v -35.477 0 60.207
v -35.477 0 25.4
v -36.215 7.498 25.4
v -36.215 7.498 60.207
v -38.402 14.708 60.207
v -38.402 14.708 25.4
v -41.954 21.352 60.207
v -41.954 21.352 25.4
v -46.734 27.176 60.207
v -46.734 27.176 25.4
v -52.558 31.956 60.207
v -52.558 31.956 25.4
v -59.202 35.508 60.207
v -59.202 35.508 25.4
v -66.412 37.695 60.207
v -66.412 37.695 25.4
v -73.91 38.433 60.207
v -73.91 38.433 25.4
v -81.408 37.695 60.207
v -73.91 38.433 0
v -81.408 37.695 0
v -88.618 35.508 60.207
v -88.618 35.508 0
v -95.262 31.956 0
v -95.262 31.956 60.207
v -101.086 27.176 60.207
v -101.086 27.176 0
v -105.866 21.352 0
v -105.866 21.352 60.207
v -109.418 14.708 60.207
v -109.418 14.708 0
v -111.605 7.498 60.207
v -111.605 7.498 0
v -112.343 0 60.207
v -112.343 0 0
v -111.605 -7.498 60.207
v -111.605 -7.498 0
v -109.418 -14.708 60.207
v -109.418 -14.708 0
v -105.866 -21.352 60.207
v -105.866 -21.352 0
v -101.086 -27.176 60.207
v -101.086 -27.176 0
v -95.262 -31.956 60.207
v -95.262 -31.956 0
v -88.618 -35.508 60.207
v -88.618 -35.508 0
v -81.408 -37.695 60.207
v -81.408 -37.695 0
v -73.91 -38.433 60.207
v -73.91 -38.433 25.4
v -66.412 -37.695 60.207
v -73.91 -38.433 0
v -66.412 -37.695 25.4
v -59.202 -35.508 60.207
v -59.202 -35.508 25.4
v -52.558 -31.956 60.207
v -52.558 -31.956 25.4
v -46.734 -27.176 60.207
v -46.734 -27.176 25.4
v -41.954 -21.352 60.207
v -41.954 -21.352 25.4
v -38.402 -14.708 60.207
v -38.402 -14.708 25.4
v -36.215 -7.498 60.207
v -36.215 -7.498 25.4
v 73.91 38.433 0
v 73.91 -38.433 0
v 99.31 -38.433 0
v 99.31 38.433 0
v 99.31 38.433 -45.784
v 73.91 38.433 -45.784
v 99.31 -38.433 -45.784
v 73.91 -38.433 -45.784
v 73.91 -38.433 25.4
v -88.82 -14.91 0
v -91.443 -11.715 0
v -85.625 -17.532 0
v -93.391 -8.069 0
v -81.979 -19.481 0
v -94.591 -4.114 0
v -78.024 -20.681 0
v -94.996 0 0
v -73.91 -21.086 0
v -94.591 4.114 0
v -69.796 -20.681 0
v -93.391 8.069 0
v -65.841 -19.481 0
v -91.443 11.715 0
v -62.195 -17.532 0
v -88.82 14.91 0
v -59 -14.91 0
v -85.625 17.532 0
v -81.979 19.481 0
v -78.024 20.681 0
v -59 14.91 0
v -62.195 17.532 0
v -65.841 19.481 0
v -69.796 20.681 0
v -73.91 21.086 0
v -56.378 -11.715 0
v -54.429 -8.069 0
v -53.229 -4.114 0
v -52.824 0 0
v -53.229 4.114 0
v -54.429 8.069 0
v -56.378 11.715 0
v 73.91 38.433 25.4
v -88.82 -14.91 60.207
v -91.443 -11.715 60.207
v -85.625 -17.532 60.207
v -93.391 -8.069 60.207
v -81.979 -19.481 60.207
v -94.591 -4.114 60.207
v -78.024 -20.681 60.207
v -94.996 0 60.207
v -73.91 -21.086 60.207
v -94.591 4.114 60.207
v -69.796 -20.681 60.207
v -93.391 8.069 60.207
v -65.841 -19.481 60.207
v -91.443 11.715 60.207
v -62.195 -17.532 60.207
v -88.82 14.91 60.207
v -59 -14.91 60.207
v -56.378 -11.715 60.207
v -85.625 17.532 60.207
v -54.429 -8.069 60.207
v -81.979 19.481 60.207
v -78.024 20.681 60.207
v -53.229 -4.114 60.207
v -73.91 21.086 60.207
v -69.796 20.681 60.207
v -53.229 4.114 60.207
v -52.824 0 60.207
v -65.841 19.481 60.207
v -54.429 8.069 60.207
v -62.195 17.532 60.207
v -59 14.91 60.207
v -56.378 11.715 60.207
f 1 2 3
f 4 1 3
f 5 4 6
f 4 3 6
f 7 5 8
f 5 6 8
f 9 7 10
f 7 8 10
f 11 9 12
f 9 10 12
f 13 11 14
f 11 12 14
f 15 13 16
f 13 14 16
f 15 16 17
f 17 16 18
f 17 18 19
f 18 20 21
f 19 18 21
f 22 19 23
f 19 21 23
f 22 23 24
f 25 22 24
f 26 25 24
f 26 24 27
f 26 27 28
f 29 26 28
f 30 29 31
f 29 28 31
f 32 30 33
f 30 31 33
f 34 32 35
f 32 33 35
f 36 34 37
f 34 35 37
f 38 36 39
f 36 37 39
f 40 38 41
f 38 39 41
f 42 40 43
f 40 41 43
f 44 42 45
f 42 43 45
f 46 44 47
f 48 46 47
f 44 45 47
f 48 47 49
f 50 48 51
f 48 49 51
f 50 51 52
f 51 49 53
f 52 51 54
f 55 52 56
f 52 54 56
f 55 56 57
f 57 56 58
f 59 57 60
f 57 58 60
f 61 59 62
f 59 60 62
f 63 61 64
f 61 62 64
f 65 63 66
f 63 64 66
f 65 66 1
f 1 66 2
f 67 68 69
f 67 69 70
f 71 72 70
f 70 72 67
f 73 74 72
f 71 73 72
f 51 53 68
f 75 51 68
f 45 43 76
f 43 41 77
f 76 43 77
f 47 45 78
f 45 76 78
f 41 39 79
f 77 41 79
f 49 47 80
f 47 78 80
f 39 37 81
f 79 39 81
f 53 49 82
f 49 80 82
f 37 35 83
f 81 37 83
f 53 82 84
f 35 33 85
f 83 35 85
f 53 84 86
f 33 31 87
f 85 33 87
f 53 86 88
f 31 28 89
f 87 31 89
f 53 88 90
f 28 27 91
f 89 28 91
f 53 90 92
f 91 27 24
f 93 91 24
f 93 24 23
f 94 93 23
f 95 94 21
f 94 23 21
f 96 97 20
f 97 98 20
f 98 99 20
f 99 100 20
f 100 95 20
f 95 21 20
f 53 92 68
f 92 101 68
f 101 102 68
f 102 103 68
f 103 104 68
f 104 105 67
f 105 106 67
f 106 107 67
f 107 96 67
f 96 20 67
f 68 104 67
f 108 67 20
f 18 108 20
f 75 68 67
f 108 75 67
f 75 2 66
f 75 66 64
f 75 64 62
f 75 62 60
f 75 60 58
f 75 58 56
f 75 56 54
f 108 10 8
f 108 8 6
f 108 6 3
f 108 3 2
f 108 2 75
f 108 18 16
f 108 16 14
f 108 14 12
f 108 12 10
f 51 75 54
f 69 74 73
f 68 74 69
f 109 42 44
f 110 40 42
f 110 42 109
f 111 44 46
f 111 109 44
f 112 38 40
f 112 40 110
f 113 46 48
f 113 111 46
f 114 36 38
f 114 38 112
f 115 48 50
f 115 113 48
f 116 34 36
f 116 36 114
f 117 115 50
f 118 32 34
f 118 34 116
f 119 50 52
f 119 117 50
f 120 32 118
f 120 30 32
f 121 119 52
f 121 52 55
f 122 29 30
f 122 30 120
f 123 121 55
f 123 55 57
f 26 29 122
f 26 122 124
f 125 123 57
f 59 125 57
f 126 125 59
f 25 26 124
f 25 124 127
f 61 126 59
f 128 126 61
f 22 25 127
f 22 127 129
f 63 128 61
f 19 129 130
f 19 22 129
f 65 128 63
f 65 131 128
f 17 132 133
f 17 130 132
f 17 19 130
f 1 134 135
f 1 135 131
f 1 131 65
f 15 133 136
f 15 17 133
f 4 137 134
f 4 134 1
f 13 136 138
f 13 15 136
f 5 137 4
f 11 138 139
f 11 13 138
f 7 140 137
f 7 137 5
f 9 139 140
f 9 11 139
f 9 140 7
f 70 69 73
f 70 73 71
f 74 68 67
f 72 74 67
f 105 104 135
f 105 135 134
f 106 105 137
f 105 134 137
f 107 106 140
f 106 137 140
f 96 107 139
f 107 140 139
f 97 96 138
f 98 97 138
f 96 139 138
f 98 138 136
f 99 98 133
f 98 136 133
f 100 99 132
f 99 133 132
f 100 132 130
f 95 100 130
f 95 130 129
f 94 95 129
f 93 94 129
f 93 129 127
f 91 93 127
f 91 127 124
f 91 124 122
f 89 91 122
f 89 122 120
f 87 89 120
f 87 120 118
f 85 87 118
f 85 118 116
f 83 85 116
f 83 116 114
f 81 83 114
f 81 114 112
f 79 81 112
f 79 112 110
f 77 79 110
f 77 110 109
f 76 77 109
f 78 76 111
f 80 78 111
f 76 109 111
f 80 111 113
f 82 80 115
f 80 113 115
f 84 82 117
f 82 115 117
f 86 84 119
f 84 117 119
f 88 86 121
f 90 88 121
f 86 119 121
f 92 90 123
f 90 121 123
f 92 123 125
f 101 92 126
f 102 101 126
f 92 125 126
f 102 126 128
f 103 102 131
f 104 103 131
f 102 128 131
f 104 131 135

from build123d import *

# Parameters (mm, degrees)
F1_DEPTH = 25.4
F2_DEPTH = 60.206823051
F3_R     = 19.6934339569
F4_DEPTH = 25.4
F5_R     = 21.0861042144
F6_DEPTH = 62.1649548411
F7_W     = 76.8664777279
F7_H     = 45.7835830748
F8_DEPTH = 25.4


with BuildPart() as f1:
    # F0 (on Top) → F1 (new body)
    with BuildSketch(Plane.XY):
        with BuildLine():
            ThreePointArc((-73.9100724459, 38.4332388639), (-112.3433113098, 0), (-73.9100724459, -38.4332388639))
            Line((-73.9100724459, -38.4332388639), (-73.9100724459, 38.4332388639))
        make_face()
        with BuildLine():
            Line((-73.9100724459, -38.4332388639), (73.9100724459, -38.4332388639))
            Line((73.9100724459, -38.4332388639), (73.9100724459, 38.4332388639))
            Line((73.9100724459, 38.4332388639), (-73.9100724459, 38.4332388639))
            ThreePointArc((-73.9100724459, 38.4332388639), (-46.7336686222, 27.1764038237), (-35.4768335819, 0))
            ThreePointArc((-35.4768335819, 0), (-46.7336686222, -27.1764038237), (-73.9100724459, -38.4332388639))
        make_face()
        with BuildLine():
            Line((-73.9100724459, 38.4332388639), (-73.9100724459, -38.4332388639))
            ThreePointArc((-73.9100724459, -38.4332388639), (-46.7336686222, -27.1764038237), (-35.4768335819, 0))
            ThreePointArc((-35.4768335819, 0), (-46.7336686222, 27.1764038237), (-73.9100724459, 38.4332388639))
        make_face()
    extrude(amount=F1_DEPTH)

    # F0 (on Top) → F2 (join)
    with BuildSketch(Plane.XY):
        with BuildLine():
            ThreePointArc((-73.9100724459, 38.4332388639), (-112.3433113098, 0), (-73.9100724459, -38.4332388639))
            Line((-73.9100724459, -38.4332388639), (-73.9100724459, 38.4332388639))
        make_face()
        with BuildLine():
            Line((-73.9100724459, 38.4332388639), (-73.9100724459, -38.4332388639))
            ThreePointArc((-73.9100724459, -38.4332388639), (-46.7336686222, -27.1764038237), (-35.4768335819, 0))
            ThreePointArc((-35.4768335819, 0), (-46.7336686222, 27.1764038237), (-73.9100724459, 38.4332388639))
        make_face()
    extrude(amount=F2_DEPTH)

    # F3 (on face) → F4 (cut)
    with BuildSketch(Plane.XY):
        with Locations((-73.3075961471, 0)):
            Circle(F3_R)
    extrude(amount=-F4_DEPTH, mode=Mode.SUBTRACT)

    # F5 (on face) → F6 (cut)
    with BuildSketch(Plane.XY.offset(60.206823051)):
        with Locations((-73.9100724459, 0)):
            Circle(F5_R)
    extrude(amount=-F6_DEPTH, mode=Mode.SUBTRACT)


with BuildPart() as f8:
    # F7 (on face) → F8 (new body)
    with BuildSketch(Plane.YZ.offset(73.9100724459)):
        with Locations((0, -22.8917915374)):
            Rectangle(F7_W, F7_H)
    extrude(amount=F8_DEPTH)


solid = Compound([f1.part, f8.part])
